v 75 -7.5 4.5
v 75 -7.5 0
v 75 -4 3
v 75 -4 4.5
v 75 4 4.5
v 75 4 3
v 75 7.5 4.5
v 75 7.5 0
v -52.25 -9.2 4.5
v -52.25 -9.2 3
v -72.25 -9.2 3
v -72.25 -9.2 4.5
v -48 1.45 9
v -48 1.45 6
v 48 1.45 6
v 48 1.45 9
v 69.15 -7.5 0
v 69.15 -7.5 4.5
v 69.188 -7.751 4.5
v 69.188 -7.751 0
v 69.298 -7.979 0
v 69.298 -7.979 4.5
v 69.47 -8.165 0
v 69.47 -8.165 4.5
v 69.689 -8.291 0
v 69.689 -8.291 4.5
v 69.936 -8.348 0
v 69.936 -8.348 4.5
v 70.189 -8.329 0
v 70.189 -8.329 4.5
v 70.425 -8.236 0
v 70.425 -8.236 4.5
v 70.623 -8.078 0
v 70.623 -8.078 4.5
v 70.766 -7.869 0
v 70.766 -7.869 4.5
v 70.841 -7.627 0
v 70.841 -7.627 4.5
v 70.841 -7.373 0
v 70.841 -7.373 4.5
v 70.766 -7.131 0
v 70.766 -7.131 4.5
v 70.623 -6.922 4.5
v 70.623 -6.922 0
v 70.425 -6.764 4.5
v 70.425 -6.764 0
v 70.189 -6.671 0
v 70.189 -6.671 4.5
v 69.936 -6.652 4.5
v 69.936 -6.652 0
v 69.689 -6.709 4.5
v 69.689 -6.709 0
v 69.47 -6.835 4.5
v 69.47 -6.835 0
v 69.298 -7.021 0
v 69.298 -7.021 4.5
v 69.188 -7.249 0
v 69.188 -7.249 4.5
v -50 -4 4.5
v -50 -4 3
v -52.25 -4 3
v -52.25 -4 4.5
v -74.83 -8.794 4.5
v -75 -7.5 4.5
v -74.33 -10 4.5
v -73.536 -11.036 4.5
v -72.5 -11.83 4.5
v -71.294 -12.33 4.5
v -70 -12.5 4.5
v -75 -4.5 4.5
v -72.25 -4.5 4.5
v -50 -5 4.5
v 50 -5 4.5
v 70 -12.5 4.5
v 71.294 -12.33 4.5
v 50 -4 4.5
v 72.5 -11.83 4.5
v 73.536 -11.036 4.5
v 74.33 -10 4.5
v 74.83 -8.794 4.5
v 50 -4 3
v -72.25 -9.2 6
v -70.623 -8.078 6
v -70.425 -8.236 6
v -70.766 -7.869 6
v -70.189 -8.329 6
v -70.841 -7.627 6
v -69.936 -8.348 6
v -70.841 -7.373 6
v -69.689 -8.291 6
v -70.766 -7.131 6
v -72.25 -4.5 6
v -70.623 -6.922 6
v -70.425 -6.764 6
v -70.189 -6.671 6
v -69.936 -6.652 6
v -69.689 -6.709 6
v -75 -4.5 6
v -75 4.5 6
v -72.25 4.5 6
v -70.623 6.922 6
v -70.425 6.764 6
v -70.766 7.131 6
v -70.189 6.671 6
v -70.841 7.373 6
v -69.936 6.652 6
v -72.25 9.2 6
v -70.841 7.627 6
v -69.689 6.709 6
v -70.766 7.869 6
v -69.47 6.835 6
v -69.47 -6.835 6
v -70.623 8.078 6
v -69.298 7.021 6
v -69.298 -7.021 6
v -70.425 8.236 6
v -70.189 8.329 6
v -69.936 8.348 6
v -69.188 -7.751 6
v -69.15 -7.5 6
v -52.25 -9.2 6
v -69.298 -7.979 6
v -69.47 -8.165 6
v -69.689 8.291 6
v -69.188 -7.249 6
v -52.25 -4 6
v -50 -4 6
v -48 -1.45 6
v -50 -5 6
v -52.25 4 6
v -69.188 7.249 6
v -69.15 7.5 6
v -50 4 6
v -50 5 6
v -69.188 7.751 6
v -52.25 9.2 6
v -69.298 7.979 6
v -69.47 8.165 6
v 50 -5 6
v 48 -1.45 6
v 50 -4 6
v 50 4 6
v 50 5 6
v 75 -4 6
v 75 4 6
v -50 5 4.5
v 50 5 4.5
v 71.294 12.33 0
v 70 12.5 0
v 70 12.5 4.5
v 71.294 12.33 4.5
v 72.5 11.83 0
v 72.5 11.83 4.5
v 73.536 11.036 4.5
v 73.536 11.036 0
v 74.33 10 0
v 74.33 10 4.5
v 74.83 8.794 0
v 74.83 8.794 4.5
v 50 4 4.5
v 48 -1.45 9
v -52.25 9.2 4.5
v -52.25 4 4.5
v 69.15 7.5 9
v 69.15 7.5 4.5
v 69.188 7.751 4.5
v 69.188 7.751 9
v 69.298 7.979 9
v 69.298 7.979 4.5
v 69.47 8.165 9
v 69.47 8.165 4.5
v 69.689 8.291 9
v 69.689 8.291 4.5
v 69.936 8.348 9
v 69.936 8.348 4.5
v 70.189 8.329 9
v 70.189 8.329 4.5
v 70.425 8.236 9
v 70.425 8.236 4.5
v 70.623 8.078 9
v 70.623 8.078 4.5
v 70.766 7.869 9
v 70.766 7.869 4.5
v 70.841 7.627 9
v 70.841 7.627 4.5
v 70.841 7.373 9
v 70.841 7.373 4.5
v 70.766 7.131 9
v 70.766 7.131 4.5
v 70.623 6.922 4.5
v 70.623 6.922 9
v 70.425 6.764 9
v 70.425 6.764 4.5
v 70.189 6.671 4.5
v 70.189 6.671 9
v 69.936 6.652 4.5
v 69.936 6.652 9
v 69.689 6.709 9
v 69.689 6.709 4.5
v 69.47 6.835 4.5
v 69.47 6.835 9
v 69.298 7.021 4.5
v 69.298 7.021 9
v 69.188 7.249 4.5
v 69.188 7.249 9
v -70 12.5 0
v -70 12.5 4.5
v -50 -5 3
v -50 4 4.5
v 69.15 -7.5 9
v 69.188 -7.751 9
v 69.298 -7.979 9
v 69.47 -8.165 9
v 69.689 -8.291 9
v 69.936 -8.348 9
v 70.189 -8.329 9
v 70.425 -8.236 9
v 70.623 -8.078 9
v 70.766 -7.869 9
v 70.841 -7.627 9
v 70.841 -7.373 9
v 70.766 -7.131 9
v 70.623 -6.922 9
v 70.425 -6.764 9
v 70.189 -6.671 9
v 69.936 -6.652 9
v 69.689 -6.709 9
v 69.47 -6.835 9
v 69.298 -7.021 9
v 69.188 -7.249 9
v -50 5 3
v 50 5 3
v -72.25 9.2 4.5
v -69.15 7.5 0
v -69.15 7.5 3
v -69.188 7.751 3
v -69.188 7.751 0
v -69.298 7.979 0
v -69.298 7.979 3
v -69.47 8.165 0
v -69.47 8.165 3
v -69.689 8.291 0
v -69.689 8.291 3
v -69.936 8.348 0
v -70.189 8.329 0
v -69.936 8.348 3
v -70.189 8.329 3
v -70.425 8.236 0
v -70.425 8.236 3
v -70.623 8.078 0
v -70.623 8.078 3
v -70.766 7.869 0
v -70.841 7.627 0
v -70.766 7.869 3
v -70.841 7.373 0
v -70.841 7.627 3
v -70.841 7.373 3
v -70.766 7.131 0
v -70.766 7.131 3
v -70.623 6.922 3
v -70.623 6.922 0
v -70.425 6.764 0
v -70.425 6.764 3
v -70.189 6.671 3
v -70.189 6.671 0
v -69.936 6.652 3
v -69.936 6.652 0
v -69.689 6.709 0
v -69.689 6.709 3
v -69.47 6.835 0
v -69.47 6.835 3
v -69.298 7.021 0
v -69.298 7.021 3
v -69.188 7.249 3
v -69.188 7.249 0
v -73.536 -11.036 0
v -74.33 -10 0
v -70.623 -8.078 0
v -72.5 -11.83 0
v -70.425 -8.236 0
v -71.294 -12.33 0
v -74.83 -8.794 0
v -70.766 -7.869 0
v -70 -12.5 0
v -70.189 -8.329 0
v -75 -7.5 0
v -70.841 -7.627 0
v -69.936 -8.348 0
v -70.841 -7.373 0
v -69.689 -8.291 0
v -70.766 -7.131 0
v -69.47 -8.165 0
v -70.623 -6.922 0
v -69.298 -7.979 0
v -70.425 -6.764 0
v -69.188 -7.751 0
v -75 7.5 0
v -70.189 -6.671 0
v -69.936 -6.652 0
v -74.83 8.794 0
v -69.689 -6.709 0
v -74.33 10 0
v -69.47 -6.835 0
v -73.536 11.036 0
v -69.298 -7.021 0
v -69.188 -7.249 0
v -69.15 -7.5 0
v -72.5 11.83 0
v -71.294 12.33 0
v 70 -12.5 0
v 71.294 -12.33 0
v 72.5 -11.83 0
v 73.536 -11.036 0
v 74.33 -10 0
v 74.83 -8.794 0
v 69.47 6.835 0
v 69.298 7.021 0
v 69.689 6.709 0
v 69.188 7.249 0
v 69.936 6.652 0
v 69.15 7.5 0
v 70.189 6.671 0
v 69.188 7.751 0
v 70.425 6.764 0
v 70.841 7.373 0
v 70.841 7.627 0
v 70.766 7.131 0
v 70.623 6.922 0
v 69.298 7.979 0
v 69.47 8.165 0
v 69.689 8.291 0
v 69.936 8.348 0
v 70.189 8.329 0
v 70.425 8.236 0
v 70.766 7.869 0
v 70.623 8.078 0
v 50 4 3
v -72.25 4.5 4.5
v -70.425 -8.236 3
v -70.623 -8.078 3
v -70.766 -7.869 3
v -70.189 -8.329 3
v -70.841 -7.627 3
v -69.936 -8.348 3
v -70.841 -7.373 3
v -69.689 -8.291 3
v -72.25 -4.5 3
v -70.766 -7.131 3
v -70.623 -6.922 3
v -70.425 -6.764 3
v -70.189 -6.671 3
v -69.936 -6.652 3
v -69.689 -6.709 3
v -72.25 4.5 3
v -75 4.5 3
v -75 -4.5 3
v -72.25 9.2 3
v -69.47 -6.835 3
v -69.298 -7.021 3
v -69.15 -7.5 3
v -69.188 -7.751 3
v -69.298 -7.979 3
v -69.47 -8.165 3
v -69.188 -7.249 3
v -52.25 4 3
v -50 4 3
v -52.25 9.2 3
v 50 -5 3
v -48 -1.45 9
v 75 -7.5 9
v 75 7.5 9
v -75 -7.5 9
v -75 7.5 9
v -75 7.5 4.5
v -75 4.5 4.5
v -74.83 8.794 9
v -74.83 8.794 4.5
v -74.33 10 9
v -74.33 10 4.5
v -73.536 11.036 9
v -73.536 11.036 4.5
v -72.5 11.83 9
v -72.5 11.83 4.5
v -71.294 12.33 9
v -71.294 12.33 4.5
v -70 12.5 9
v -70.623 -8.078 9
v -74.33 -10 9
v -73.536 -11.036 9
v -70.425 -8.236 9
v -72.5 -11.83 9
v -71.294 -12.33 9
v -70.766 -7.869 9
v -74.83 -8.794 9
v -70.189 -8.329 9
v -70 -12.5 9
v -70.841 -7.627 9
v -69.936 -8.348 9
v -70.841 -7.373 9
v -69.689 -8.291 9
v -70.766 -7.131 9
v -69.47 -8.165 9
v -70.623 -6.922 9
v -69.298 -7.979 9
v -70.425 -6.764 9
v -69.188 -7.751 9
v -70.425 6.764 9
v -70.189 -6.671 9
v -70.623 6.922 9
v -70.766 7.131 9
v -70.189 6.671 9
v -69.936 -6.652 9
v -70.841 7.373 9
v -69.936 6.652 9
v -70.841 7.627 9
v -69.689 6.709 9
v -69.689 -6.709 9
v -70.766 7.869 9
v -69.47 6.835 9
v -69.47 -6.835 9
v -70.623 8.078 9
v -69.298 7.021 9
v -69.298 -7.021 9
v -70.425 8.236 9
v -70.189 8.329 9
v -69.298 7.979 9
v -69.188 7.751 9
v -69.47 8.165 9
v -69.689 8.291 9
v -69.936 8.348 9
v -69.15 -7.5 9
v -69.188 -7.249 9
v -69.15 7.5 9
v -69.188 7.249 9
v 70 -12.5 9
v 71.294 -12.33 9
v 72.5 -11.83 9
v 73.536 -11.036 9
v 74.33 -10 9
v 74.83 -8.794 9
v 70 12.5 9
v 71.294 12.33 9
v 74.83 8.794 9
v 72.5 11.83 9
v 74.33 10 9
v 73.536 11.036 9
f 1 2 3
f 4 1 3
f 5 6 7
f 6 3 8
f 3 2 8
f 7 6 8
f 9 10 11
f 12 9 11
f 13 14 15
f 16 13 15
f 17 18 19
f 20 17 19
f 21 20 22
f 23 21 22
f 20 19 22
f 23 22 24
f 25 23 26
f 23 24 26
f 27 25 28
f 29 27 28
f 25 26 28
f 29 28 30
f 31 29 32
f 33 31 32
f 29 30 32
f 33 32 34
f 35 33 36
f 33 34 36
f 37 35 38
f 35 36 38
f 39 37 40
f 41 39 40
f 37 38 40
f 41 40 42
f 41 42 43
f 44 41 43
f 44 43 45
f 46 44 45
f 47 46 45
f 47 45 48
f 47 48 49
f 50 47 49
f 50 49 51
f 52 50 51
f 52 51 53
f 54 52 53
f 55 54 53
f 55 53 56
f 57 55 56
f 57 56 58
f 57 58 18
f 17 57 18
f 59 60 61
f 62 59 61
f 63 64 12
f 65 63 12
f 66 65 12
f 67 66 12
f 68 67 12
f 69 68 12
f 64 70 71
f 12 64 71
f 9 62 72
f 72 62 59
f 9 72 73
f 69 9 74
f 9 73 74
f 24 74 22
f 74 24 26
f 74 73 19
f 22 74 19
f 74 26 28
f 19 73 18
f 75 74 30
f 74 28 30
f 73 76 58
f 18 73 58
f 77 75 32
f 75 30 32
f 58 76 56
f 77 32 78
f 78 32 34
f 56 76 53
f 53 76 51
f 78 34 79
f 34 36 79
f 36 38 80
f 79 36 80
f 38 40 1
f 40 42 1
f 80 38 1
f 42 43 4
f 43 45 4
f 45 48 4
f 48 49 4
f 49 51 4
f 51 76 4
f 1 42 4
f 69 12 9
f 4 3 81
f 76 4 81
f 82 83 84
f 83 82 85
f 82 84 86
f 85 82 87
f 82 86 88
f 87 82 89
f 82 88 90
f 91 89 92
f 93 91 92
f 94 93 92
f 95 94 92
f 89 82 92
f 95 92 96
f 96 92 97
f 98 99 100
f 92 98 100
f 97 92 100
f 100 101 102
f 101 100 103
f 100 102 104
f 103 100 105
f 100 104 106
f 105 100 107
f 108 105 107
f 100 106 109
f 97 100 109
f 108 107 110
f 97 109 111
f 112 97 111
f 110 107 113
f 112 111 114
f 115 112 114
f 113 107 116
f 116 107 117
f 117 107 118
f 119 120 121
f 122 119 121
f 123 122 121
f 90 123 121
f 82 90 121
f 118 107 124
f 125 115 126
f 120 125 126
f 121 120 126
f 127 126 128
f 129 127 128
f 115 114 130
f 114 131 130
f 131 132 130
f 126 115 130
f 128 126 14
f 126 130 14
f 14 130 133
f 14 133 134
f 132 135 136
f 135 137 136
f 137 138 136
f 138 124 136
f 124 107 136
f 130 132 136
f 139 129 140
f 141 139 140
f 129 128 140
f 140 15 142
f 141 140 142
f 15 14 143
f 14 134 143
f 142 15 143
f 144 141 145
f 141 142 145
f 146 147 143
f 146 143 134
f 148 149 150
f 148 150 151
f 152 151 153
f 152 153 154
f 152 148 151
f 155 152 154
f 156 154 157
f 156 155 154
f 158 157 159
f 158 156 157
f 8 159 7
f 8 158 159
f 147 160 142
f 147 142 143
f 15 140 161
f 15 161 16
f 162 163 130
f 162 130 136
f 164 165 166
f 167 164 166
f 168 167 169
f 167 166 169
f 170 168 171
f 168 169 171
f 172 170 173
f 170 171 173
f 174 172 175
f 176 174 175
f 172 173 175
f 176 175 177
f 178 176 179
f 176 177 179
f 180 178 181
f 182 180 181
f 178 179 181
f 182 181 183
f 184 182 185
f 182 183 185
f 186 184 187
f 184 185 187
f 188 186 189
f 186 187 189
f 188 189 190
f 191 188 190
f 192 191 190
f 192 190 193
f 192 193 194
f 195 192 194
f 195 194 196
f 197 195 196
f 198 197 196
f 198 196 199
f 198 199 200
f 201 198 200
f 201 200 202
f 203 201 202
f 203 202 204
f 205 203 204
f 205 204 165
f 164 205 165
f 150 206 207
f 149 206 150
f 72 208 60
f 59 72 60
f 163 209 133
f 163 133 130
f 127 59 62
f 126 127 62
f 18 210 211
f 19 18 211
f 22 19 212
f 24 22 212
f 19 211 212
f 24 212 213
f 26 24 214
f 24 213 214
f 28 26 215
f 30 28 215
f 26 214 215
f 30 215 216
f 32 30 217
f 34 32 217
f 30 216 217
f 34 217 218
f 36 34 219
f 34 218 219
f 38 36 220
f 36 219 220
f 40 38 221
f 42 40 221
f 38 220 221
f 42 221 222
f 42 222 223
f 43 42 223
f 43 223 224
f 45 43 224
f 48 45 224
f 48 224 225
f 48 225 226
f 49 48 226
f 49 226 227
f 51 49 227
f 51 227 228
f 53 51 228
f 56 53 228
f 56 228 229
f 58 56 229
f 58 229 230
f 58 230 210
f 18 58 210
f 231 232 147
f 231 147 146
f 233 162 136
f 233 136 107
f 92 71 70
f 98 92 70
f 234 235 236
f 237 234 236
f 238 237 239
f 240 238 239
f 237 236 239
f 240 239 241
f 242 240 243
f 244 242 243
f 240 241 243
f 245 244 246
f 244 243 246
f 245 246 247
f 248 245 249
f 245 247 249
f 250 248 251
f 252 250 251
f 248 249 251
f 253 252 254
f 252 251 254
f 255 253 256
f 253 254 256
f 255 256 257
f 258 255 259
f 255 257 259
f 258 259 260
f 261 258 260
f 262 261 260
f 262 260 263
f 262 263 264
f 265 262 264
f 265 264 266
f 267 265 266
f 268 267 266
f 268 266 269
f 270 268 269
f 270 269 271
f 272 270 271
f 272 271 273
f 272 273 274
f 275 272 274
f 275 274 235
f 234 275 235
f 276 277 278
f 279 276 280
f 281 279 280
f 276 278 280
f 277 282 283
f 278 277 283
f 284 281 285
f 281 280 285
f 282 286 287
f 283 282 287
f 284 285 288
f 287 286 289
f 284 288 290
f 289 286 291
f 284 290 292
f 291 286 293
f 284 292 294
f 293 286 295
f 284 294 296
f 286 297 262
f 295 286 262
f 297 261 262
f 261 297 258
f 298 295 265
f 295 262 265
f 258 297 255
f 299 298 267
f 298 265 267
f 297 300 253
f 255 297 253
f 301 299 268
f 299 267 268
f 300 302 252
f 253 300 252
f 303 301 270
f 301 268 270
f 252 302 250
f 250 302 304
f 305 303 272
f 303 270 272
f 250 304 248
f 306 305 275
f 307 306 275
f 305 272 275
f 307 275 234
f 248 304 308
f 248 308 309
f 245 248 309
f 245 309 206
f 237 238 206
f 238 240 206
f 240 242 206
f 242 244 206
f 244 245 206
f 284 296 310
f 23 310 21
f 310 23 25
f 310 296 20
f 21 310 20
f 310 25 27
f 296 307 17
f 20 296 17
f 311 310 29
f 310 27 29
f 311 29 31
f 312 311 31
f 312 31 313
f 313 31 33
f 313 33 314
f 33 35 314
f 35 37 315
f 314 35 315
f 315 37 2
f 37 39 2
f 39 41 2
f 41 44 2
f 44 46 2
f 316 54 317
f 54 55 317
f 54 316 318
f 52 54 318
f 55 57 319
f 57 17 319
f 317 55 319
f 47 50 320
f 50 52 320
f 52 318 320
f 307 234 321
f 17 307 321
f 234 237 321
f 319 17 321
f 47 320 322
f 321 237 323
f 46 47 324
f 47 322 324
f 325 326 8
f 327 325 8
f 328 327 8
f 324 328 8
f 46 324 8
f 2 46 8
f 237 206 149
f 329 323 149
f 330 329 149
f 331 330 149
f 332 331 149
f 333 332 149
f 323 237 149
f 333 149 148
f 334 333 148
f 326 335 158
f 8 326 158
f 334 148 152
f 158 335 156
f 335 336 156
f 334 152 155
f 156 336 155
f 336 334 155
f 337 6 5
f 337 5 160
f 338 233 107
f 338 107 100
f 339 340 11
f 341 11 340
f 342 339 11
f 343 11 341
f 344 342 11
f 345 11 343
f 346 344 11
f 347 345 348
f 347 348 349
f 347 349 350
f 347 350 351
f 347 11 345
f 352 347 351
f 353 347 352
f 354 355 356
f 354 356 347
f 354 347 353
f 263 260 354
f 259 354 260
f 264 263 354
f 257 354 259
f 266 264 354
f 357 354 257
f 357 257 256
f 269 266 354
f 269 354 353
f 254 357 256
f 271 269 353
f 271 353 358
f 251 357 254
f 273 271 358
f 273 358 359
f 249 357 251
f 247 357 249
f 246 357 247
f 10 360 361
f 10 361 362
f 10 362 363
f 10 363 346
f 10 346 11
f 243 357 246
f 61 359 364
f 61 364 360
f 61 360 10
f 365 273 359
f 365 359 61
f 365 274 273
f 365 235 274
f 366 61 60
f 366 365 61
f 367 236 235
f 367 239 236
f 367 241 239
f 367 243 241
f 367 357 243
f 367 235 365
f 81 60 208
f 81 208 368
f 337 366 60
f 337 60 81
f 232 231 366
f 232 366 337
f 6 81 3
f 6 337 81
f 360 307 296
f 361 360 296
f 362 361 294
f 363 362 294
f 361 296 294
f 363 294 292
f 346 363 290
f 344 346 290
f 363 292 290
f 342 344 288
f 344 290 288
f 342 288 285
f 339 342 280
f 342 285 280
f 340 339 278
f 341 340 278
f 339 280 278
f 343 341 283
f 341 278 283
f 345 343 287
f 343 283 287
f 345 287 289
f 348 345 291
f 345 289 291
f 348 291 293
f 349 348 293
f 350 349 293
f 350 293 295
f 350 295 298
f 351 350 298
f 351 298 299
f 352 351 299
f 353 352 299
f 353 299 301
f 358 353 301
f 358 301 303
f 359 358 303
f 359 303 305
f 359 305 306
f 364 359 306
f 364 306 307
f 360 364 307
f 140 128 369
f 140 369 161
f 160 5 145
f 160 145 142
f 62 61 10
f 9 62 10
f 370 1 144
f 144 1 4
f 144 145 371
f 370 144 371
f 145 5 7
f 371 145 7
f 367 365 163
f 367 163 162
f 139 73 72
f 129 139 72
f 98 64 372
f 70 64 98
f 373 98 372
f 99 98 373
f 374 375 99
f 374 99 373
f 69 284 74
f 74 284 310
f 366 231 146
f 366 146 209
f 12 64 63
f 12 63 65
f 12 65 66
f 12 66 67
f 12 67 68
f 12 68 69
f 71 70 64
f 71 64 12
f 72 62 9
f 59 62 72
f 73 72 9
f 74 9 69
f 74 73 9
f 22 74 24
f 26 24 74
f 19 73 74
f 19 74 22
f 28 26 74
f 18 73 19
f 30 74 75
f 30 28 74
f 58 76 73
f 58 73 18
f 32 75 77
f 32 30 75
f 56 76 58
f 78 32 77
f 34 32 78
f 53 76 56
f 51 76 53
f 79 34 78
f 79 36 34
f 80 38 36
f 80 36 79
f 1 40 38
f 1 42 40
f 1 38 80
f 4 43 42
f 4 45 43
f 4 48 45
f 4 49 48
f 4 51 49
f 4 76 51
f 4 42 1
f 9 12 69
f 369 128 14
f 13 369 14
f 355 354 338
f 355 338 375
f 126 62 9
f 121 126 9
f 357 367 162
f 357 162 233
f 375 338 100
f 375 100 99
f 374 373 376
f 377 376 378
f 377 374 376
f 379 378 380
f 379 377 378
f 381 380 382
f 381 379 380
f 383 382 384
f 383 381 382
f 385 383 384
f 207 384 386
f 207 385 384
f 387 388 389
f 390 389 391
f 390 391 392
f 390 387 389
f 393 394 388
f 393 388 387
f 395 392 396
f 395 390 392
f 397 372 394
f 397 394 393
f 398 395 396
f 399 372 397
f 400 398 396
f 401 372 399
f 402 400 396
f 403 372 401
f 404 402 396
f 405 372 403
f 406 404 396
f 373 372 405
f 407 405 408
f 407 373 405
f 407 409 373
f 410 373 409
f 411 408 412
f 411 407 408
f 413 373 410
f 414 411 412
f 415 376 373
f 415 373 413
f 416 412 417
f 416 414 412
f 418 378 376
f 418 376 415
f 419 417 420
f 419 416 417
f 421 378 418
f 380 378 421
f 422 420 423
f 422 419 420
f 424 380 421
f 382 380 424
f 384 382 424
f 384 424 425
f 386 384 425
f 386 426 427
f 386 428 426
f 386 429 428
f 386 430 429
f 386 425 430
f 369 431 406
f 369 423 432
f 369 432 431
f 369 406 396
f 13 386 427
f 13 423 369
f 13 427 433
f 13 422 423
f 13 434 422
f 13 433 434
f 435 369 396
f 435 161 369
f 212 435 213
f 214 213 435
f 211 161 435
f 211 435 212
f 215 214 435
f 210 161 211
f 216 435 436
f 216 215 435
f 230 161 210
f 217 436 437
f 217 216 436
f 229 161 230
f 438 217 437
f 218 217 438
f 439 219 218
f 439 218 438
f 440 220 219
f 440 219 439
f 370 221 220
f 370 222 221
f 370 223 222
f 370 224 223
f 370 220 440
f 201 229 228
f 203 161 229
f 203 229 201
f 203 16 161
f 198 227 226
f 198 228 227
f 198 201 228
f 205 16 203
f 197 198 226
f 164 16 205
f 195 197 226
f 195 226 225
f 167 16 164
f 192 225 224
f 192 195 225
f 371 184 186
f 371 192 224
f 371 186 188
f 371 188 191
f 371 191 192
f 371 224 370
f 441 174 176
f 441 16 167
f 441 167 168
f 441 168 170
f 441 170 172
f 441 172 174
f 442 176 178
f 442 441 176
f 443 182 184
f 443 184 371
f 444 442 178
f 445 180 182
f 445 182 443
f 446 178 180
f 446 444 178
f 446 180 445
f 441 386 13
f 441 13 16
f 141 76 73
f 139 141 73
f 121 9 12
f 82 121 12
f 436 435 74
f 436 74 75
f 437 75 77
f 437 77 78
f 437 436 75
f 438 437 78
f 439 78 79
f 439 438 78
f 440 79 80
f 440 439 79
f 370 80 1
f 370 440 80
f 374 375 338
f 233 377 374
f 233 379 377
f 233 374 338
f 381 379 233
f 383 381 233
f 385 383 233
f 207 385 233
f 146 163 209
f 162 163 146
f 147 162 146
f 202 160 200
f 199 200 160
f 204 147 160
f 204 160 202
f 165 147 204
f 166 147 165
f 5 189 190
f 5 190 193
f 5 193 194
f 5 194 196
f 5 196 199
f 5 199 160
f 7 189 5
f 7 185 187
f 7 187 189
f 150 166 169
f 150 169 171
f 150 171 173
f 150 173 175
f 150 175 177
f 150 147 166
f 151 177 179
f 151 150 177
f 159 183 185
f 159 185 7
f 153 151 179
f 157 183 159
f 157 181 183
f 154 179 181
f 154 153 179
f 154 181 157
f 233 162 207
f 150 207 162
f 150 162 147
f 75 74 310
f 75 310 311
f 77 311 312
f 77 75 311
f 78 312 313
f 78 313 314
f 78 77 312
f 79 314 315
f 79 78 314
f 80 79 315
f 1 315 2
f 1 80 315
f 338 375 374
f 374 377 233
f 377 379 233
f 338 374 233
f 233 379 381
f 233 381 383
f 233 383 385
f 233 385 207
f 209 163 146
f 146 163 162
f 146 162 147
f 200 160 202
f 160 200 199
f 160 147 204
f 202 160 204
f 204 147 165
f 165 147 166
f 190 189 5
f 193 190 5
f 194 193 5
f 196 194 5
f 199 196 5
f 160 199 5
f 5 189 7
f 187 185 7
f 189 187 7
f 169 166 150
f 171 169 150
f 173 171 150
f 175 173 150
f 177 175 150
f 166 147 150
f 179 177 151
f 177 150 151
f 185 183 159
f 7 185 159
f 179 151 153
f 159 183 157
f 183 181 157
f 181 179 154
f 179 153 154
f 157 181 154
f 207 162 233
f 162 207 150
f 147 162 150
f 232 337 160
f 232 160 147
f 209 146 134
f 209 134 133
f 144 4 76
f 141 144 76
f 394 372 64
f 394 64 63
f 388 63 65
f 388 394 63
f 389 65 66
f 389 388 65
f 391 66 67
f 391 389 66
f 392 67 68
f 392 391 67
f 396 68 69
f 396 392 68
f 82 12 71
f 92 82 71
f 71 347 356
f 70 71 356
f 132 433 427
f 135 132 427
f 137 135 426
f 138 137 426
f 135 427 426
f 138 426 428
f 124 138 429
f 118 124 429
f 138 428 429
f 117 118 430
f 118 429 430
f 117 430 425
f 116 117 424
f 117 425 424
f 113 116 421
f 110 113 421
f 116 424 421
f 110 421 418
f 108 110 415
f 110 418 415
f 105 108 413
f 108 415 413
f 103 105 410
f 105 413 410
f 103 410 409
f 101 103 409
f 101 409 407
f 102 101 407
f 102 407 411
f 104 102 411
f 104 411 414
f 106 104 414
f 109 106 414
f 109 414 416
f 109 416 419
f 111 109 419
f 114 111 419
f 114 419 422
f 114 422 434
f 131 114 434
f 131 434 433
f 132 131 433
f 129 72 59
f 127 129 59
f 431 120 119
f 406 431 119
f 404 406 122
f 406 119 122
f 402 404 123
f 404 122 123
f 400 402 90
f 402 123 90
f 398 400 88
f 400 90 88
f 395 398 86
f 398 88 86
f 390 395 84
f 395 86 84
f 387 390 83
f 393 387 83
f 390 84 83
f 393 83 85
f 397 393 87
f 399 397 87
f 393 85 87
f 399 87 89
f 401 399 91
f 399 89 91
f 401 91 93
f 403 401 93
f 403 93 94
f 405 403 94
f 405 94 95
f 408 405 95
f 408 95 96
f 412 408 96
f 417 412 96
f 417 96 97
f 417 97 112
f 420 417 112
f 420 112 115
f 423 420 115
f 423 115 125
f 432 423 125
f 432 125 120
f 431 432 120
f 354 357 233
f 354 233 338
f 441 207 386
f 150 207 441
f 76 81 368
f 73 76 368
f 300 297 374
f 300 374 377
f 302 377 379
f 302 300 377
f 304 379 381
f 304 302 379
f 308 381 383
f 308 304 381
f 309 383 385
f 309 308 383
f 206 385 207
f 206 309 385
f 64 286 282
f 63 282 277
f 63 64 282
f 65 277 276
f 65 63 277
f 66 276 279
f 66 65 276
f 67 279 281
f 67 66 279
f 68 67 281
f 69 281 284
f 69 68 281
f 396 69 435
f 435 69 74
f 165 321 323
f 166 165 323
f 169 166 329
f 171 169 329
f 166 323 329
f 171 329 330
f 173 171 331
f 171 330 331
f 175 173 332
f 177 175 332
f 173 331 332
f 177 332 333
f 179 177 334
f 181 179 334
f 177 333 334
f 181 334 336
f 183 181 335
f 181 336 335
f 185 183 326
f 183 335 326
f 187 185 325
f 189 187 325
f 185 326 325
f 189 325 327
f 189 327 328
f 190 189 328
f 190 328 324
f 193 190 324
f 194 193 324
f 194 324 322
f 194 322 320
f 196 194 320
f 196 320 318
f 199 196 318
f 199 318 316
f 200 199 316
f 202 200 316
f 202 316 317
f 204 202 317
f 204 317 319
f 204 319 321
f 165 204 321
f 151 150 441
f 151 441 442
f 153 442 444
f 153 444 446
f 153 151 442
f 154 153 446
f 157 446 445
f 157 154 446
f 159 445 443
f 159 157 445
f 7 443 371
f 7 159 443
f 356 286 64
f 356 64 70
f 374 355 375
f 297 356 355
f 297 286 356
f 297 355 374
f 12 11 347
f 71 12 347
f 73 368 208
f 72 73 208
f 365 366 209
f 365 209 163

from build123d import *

# Parameters (mm, degrees)
BOX_BOTTOM_HALF_0_W     = 152
BOX_BOTTOM_HALF_0_H     = 27
BOX_BOTTOM_HALF_0_DEPTH = 5.5
SKETCH_W                = 150
SKETCH_H                = 25
PAD_DEPTH               = 3
PAD001_DEPTH            = 3
SKETCH004_W             = 150
SKETCH004_H             = 25
SKETCH004_W_2           = 96
SKETCH004_H_2           = 2.9
PAD002_DEPTH            = 3
SKETCH005_R             = 0.85
POCKET_DEPTH            = 313.671314
POLARPATTERN_COUNT      = 2
POLARPATTERN001_COUNT   = 2
POLARPATTERN002_COUNT   = 2
FILLET_R                = 5


with BuildPart() as box_bottom_half_0_body:
    # box_bottom_half_0 → box_bottom_half_0 (new body)
    with BuildSketch(Plane(origin=(-76, -13.5, -1), x_dir=(1, 0, 0), z_dir=(0, 0, 1))):
        with Locations((76, 13.5)):
            Rectangle(BOX_BOTTOM_HALF_0_W, BOX_BOTTOM_HALF_0_H)
    extrude(amount=BOX_BOTTOM_HALF_0_DEPTH)


with BuildPart() as body:
    # Sketch → Pad (new body)
    with BuildSketch(Plane.XY):
        Rectangle(SKETCH_W, SKETCH_H)
    extrude(amount=PAD_DEPTH)

    # Sketch001 (on Face6 of Pad) → Pad001 (join)
    with BuildSketch(Plane.XY.offset(3)):
        Polygon((-75, 12.5), (75, 12.5), (75, 4), (50, 4), (50, 5), (-50, 5), (-50, 4), (-52.25, 4), (-52.25, 9.2), (-72.25, 9.2), (-72.25, 4.5), (-75, 4.5), align=None)
        Polygon((-75, -12.5), (75, -12.5), (75, -4), (50, -4), (50, -5), (-50, -5), (-50, -4), (-52.25, -4), (-52.25, -9.2), (-72.25, -9.2), (-72.25, -4.5), (-75, -4.5), align=None)
    extrude(amount=PAD001_DEPTH)

    # Sketch004 (on Face12 of Pad001) → Pad002 (join)
    with BuildSketch(Plane.XY.offset(6)):
        Rectangle(SKETCH004_W, SKETCH004_H)
        Rectangle(SKETCH004_W_2, SKETCH004_H_2, mode=Mode.SUBTRACT)
    extrude(amount=PAD002_DEPTH)

    # Sketch005 (on Face34 of Pad002) → Pocket (cut, through all)
    with BuildSketch(Plane.XY.offset(9)):
        with Locations((-70, 7.5)):
            Circle(SKETCH005_R)
    pocket = extrude(amount=-POCKET_DEPTH, mode=Mode.SUBTRACT)

    # PolarPattern: Pocket ×2 about axis
    polarpattern_axis = Axis((0, 0, 9), (0, 0, 1))
    for i in range(1, POLARPATTERN_COUNT):
        add(pocket.rotate(polarpattern_axis, i * 360 / POLARPATTERN_COUNT), mode=Mode.SUBTRACT)

    # PolarPattern001: Pocket ×2 about axis
    polarpattern001_axis = Axis((0, 0, 0), (0, 1, 0))
    for i in range(1, POLARPATTERN001_COUNT):
        add(pocket.rotate(polarpattern001_axis, i * 360 / POLARPATTERN001_COUNT), mode=Mode.SUBTRACT)

    # PolarPattern002: Pocket ×2 about axis
    polarpattern002_axis = Axis((0, 0, 0), (1, 0, 0))
    for i in range(1, POLARPATTERN002_COUNT):
        add(pocket.rotate(polarpattern002_axis, i * 360 / POLARPATTERN002_COUNT), mode=Mode.SUBTRACT)

    # Fillet
    fillet_edges = [body.edges().sort_by_distance(p)[0] for p in [
        (75, -12.5, 7.5),
        (75, 12.5, 7.5),
        (-75, -12.5, 7.5),
        (-75, 12.5, 7.5),
    ]]
    fillet(fillet_edges, radius=FILLET_R)


with BuildPart() as bottom_half_0_body:
    # bottom_half_0 base: copy of Body
    add(body.part)

    # bottom_half_0: intersect box_bottom_half_0 body
    add(box_bottom_half_0_body.part, mode=Mode.INTERSECT)


with BuildPart() as top_half_0_body:
    # top_half_0 base: copy of Body
    add(body.part)

    # top_half_0: cut box_bottom_half_0 body
    add(box_bottom_half_0_body.part, mode=Mode.SUBTRACT)


solid = Compound([bottom_half_0_body.part, top_half_0_body.part])
